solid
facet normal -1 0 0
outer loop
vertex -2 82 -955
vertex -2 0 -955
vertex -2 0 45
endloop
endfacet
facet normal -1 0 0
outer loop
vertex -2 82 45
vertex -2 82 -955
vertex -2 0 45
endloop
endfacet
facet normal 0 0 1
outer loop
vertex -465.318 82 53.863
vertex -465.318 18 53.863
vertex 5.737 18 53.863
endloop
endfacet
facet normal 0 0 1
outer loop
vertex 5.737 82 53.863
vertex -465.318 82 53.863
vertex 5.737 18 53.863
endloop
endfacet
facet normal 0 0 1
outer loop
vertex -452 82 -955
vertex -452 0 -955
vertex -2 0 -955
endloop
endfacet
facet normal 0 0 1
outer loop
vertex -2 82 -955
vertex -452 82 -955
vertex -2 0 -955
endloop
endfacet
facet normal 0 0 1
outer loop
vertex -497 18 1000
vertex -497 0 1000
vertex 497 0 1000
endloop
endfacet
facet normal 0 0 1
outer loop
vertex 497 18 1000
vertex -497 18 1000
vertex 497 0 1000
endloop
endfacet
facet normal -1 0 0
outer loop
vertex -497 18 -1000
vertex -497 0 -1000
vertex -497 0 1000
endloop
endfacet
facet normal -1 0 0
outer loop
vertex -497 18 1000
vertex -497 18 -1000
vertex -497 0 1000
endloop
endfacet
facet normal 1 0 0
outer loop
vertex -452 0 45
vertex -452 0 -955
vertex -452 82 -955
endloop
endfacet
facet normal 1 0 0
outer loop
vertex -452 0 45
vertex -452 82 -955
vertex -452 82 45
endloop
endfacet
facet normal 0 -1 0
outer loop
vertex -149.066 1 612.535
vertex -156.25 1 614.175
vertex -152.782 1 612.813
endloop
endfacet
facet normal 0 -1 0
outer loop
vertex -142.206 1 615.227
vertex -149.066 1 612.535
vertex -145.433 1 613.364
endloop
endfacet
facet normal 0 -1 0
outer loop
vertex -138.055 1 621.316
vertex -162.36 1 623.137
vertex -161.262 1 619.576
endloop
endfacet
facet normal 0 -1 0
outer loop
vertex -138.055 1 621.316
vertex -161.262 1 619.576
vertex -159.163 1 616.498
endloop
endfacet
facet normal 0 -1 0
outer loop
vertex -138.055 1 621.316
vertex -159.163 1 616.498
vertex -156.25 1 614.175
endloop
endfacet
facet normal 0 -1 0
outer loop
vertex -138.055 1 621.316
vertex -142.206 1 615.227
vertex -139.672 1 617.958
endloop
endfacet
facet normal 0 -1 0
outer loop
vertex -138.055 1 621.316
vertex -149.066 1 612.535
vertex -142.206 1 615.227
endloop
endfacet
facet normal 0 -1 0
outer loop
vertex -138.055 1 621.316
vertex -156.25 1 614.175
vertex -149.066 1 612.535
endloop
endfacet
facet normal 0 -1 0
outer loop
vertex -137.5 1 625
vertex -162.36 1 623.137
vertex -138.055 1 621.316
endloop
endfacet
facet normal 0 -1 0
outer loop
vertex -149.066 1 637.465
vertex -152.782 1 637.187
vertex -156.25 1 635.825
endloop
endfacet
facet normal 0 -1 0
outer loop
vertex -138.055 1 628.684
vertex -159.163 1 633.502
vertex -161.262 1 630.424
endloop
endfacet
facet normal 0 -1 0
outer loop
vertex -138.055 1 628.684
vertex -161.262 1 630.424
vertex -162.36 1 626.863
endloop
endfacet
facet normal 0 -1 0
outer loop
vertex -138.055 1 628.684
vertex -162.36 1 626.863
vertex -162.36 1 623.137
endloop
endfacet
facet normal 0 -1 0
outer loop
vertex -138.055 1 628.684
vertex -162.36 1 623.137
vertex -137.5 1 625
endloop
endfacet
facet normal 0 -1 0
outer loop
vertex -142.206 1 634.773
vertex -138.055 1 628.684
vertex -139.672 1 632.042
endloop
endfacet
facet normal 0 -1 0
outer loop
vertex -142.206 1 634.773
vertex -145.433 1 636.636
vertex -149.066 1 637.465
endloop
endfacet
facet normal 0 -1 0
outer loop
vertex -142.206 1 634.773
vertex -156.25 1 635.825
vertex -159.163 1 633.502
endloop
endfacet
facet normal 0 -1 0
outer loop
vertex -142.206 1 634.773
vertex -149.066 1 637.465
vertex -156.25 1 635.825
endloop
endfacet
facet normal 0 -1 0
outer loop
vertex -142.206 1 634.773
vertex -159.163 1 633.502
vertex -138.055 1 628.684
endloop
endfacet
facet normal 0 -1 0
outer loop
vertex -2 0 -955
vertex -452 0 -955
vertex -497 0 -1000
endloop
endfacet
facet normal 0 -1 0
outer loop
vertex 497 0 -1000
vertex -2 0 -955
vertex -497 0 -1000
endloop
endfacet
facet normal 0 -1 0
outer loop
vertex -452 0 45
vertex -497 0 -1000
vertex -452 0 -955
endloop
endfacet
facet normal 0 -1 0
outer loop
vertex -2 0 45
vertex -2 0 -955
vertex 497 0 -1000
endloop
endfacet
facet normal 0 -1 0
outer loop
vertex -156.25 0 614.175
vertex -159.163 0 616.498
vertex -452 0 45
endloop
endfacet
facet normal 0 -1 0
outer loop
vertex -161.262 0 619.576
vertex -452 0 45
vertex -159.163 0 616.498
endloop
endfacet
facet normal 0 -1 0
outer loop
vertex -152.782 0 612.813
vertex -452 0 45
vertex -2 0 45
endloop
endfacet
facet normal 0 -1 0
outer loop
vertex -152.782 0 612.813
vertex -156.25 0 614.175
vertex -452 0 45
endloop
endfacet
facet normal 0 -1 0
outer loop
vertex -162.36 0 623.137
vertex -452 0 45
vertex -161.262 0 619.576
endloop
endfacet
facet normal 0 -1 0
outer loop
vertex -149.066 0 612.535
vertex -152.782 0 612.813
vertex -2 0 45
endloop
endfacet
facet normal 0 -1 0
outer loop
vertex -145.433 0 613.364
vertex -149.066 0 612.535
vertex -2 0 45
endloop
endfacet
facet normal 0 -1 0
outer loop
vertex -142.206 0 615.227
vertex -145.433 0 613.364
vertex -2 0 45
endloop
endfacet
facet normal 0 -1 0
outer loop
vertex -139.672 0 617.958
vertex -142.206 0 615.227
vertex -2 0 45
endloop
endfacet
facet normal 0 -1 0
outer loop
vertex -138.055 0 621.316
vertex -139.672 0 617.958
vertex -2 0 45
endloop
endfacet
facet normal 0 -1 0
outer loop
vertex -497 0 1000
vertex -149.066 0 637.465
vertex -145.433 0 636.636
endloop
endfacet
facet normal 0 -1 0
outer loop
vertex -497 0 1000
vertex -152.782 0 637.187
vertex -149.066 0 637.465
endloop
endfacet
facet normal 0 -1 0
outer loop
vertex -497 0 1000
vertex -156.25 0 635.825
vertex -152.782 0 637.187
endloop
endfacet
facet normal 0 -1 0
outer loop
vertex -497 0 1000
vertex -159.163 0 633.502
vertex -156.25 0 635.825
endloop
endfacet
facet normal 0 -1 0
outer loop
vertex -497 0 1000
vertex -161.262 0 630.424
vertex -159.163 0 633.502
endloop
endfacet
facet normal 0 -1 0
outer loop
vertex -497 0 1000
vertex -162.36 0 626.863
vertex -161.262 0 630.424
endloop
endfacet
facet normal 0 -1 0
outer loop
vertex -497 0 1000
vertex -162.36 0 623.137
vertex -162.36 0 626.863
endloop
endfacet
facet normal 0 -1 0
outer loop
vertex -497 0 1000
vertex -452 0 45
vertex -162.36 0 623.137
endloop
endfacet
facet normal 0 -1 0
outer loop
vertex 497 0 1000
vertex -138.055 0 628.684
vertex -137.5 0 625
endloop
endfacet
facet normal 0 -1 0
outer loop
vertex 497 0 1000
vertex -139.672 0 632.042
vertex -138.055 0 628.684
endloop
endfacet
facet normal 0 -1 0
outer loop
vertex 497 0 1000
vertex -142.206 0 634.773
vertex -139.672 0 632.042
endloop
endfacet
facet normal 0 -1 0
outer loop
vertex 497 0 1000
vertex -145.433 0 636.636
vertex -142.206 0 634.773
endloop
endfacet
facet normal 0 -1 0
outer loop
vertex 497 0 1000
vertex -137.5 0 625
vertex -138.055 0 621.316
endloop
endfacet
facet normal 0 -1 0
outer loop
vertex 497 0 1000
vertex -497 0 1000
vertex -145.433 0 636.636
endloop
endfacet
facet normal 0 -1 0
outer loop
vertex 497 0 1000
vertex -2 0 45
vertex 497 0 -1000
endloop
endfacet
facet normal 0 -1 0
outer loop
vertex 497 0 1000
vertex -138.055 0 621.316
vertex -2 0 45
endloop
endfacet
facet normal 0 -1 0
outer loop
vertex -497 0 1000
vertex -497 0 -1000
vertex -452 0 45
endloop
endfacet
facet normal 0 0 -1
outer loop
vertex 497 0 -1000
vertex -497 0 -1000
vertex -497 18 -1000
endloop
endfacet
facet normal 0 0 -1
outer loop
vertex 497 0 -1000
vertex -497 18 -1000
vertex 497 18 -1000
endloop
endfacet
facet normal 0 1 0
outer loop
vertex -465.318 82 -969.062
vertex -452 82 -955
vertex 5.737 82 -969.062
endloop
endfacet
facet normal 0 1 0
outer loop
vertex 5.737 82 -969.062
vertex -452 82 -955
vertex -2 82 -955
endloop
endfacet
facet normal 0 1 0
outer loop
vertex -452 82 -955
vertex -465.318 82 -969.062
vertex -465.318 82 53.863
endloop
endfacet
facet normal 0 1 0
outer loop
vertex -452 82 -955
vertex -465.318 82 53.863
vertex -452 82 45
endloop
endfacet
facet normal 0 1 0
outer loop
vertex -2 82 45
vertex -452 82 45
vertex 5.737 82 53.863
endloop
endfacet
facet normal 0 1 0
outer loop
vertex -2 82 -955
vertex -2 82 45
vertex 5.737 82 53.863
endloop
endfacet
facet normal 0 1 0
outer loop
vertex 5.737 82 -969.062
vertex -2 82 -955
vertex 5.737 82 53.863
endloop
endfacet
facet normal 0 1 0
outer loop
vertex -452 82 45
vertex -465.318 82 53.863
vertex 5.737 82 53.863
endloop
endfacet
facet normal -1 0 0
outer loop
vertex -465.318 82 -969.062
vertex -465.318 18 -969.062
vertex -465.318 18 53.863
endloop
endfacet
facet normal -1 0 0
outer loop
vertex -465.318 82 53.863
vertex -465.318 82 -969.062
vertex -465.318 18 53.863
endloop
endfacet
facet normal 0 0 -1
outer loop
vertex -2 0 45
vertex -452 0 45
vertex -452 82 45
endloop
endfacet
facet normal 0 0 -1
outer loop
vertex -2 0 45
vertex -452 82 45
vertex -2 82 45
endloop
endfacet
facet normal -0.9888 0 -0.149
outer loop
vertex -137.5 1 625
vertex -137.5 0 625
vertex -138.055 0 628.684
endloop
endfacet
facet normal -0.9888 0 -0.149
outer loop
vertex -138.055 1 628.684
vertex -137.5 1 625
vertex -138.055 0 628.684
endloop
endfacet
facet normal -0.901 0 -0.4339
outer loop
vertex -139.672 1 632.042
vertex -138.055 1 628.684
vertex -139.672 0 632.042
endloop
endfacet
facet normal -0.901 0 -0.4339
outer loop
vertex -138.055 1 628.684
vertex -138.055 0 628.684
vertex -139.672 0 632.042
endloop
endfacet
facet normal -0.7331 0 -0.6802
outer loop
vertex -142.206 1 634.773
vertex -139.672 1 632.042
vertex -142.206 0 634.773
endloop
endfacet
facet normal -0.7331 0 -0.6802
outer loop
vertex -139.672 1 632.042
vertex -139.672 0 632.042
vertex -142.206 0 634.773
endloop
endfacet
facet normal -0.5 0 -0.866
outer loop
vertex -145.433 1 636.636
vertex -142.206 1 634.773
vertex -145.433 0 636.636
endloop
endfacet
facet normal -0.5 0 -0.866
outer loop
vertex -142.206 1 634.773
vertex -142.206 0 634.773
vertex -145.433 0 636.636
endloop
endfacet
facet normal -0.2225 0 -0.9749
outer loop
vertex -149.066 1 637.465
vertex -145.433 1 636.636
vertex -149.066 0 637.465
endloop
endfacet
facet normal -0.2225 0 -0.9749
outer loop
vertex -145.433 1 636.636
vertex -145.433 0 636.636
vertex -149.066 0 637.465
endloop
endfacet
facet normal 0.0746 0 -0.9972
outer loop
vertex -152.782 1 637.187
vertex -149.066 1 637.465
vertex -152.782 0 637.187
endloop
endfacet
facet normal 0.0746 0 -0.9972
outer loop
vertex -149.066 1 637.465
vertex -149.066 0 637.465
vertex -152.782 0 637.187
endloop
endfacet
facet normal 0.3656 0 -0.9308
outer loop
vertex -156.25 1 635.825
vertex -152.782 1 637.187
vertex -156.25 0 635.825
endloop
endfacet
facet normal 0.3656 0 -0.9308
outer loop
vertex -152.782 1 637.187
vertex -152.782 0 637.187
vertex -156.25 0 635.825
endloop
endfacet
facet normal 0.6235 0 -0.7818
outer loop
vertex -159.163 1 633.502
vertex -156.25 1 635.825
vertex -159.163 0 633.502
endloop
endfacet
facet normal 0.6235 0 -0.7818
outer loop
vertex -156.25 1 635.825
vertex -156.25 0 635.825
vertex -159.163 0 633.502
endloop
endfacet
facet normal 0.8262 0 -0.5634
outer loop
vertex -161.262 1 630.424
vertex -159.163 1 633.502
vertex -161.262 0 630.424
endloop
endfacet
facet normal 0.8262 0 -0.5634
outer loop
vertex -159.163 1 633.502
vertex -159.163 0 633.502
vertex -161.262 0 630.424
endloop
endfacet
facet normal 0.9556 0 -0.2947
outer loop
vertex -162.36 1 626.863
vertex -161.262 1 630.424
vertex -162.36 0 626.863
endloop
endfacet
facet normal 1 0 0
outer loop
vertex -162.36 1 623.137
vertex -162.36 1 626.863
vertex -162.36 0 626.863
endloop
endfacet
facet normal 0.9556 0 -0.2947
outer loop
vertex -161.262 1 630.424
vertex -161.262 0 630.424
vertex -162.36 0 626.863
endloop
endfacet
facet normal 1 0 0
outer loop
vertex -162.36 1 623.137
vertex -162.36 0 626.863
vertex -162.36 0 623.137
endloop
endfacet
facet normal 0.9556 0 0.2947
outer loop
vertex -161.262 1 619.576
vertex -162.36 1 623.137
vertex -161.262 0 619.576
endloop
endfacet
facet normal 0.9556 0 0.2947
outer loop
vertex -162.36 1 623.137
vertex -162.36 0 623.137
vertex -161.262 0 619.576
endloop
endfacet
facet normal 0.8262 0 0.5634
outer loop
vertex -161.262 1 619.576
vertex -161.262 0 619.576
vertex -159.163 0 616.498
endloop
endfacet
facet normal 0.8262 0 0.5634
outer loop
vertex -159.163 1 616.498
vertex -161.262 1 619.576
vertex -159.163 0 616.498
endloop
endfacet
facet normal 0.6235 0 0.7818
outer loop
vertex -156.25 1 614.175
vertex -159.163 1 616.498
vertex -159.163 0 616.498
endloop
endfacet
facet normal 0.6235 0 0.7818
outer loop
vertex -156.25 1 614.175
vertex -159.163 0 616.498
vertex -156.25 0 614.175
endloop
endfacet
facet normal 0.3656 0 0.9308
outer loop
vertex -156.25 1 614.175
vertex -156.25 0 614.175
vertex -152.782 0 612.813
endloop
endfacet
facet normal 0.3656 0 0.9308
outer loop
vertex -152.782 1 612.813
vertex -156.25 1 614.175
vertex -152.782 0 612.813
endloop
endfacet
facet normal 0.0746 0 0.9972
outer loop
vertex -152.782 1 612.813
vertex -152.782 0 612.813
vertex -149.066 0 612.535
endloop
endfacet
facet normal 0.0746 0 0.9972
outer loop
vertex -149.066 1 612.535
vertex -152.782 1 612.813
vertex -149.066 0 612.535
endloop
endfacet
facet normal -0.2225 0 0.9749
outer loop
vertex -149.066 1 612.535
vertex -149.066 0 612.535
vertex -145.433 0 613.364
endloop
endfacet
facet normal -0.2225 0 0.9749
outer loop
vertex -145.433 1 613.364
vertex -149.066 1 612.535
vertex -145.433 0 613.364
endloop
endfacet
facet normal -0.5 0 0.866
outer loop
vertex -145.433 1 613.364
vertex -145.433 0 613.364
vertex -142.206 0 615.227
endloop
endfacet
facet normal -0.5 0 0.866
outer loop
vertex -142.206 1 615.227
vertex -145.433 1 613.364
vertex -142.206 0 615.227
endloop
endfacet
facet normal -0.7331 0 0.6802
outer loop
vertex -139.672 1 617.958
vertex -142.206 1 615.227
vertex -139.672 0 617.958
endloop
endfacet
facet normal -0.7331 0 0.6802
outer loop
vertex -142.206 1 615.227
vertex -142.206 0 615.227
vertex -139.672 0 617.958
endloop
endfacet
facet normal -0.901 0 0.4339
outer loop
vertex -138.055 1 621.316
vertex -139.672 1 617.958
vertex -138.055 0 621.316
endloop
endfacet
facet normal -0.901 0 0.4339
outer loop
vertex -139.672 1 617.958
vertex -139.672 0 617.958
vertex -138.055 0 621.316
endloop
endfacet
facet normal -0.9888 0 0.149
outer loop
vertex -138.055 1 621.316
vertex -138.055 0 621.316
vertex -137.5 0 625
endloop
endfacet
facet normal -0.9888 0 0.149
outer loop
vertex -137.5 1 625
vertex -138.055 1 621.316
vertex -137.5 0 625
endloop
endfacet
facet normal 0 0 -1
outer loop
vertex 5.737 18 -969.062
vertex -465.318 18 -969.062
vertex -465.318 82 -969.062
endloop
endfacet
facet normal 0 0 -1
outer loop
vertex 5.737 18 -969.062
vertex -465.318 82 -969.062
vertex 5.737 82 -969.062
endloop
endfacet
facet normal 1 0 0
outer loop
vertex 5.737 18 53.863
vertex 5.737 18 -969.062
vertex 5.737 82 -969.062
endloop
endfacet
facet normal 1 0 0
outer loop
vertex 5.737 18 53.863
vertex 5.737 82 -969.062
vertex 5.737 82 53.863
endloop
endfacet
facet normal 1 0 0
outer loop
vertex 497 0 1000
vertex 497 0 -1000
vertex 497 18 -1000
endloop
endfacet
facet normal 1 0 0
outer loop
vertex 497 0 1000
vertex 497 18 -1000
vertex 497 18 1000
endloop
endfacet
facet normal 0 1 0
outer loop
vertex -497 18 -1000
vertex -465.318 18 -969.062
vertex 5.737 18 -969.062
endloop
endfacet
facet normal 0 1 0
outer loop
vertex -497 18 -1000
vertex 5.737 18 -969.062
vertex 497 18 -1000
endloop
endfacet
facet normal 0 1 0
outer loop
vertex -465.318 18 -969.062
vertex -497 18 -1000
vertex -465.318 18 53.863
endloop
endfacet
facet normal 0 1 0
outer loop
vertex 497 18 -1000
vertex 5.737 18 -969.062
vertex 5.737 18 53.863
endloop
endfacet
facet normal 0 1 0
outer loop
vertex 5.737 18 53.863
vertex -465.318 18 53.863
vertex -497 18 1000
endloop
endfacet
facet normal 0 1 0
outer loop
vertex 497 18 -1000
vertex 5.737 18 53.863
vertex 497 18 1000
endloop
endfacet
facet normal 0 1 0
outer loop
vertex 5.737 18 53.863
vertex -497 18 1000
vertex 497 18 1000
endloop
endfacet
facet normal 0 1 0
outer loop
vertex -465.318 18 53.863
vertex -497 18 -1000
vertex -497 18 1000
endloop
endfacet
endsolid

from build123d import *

# Parameters (mm, degrees)
F0_W     = 994
F0_H     = 2000
F1_DEPTH = 18
F2_R     = 12.5
F3_DEPTH = 1
F4_W     = 450
F4_H     = 1000
F5_DEPTH = 82
F6_W     = 471.055174
F6_H     = 1022.924457
F6_W_2   = 450
F6_H_2   = 1000
F7_DEPTH = 82


with BuildPart() as f1:
    # F0 (on Front) → F1 (new body)
    with BuildSketch(Plane.XZ):
        Rectangle(F0_W, F0_H)
    extrude(amount=-F1_DEPTH)

    # F2 (on face) → F3 (cut)
    with BuildSketch(Plane.XZ):
        with Locations((-150, 625)):
            Circle(F2_R)
    extrude(amount=-F3_DEPTH, mode=Mode.SUBTRACT)

    # F4 (on face) → F5 (cut)
    with BuildSketch(Plane.XZ):
        with Locations((-227, -455)):
            Rectangle(F4_W, F4_H)
    extrude(amount=-F5_DEPTH, mode=Mode.SUBTRACT)

    # F6 (on face) → F7 (join)
    with BuildSketch(Plane.XZ):
        with Locations((-229.790854, -457.599444)):
            Rectangle(F6_W, F6_H)
        with Locations((-227, -455)):
            Rectangle(F6_W_2, F6_H_2, mode=Mode.SUBTRACT)
    extrude(amount=-F7_DEPTH)


solid = f1.part
